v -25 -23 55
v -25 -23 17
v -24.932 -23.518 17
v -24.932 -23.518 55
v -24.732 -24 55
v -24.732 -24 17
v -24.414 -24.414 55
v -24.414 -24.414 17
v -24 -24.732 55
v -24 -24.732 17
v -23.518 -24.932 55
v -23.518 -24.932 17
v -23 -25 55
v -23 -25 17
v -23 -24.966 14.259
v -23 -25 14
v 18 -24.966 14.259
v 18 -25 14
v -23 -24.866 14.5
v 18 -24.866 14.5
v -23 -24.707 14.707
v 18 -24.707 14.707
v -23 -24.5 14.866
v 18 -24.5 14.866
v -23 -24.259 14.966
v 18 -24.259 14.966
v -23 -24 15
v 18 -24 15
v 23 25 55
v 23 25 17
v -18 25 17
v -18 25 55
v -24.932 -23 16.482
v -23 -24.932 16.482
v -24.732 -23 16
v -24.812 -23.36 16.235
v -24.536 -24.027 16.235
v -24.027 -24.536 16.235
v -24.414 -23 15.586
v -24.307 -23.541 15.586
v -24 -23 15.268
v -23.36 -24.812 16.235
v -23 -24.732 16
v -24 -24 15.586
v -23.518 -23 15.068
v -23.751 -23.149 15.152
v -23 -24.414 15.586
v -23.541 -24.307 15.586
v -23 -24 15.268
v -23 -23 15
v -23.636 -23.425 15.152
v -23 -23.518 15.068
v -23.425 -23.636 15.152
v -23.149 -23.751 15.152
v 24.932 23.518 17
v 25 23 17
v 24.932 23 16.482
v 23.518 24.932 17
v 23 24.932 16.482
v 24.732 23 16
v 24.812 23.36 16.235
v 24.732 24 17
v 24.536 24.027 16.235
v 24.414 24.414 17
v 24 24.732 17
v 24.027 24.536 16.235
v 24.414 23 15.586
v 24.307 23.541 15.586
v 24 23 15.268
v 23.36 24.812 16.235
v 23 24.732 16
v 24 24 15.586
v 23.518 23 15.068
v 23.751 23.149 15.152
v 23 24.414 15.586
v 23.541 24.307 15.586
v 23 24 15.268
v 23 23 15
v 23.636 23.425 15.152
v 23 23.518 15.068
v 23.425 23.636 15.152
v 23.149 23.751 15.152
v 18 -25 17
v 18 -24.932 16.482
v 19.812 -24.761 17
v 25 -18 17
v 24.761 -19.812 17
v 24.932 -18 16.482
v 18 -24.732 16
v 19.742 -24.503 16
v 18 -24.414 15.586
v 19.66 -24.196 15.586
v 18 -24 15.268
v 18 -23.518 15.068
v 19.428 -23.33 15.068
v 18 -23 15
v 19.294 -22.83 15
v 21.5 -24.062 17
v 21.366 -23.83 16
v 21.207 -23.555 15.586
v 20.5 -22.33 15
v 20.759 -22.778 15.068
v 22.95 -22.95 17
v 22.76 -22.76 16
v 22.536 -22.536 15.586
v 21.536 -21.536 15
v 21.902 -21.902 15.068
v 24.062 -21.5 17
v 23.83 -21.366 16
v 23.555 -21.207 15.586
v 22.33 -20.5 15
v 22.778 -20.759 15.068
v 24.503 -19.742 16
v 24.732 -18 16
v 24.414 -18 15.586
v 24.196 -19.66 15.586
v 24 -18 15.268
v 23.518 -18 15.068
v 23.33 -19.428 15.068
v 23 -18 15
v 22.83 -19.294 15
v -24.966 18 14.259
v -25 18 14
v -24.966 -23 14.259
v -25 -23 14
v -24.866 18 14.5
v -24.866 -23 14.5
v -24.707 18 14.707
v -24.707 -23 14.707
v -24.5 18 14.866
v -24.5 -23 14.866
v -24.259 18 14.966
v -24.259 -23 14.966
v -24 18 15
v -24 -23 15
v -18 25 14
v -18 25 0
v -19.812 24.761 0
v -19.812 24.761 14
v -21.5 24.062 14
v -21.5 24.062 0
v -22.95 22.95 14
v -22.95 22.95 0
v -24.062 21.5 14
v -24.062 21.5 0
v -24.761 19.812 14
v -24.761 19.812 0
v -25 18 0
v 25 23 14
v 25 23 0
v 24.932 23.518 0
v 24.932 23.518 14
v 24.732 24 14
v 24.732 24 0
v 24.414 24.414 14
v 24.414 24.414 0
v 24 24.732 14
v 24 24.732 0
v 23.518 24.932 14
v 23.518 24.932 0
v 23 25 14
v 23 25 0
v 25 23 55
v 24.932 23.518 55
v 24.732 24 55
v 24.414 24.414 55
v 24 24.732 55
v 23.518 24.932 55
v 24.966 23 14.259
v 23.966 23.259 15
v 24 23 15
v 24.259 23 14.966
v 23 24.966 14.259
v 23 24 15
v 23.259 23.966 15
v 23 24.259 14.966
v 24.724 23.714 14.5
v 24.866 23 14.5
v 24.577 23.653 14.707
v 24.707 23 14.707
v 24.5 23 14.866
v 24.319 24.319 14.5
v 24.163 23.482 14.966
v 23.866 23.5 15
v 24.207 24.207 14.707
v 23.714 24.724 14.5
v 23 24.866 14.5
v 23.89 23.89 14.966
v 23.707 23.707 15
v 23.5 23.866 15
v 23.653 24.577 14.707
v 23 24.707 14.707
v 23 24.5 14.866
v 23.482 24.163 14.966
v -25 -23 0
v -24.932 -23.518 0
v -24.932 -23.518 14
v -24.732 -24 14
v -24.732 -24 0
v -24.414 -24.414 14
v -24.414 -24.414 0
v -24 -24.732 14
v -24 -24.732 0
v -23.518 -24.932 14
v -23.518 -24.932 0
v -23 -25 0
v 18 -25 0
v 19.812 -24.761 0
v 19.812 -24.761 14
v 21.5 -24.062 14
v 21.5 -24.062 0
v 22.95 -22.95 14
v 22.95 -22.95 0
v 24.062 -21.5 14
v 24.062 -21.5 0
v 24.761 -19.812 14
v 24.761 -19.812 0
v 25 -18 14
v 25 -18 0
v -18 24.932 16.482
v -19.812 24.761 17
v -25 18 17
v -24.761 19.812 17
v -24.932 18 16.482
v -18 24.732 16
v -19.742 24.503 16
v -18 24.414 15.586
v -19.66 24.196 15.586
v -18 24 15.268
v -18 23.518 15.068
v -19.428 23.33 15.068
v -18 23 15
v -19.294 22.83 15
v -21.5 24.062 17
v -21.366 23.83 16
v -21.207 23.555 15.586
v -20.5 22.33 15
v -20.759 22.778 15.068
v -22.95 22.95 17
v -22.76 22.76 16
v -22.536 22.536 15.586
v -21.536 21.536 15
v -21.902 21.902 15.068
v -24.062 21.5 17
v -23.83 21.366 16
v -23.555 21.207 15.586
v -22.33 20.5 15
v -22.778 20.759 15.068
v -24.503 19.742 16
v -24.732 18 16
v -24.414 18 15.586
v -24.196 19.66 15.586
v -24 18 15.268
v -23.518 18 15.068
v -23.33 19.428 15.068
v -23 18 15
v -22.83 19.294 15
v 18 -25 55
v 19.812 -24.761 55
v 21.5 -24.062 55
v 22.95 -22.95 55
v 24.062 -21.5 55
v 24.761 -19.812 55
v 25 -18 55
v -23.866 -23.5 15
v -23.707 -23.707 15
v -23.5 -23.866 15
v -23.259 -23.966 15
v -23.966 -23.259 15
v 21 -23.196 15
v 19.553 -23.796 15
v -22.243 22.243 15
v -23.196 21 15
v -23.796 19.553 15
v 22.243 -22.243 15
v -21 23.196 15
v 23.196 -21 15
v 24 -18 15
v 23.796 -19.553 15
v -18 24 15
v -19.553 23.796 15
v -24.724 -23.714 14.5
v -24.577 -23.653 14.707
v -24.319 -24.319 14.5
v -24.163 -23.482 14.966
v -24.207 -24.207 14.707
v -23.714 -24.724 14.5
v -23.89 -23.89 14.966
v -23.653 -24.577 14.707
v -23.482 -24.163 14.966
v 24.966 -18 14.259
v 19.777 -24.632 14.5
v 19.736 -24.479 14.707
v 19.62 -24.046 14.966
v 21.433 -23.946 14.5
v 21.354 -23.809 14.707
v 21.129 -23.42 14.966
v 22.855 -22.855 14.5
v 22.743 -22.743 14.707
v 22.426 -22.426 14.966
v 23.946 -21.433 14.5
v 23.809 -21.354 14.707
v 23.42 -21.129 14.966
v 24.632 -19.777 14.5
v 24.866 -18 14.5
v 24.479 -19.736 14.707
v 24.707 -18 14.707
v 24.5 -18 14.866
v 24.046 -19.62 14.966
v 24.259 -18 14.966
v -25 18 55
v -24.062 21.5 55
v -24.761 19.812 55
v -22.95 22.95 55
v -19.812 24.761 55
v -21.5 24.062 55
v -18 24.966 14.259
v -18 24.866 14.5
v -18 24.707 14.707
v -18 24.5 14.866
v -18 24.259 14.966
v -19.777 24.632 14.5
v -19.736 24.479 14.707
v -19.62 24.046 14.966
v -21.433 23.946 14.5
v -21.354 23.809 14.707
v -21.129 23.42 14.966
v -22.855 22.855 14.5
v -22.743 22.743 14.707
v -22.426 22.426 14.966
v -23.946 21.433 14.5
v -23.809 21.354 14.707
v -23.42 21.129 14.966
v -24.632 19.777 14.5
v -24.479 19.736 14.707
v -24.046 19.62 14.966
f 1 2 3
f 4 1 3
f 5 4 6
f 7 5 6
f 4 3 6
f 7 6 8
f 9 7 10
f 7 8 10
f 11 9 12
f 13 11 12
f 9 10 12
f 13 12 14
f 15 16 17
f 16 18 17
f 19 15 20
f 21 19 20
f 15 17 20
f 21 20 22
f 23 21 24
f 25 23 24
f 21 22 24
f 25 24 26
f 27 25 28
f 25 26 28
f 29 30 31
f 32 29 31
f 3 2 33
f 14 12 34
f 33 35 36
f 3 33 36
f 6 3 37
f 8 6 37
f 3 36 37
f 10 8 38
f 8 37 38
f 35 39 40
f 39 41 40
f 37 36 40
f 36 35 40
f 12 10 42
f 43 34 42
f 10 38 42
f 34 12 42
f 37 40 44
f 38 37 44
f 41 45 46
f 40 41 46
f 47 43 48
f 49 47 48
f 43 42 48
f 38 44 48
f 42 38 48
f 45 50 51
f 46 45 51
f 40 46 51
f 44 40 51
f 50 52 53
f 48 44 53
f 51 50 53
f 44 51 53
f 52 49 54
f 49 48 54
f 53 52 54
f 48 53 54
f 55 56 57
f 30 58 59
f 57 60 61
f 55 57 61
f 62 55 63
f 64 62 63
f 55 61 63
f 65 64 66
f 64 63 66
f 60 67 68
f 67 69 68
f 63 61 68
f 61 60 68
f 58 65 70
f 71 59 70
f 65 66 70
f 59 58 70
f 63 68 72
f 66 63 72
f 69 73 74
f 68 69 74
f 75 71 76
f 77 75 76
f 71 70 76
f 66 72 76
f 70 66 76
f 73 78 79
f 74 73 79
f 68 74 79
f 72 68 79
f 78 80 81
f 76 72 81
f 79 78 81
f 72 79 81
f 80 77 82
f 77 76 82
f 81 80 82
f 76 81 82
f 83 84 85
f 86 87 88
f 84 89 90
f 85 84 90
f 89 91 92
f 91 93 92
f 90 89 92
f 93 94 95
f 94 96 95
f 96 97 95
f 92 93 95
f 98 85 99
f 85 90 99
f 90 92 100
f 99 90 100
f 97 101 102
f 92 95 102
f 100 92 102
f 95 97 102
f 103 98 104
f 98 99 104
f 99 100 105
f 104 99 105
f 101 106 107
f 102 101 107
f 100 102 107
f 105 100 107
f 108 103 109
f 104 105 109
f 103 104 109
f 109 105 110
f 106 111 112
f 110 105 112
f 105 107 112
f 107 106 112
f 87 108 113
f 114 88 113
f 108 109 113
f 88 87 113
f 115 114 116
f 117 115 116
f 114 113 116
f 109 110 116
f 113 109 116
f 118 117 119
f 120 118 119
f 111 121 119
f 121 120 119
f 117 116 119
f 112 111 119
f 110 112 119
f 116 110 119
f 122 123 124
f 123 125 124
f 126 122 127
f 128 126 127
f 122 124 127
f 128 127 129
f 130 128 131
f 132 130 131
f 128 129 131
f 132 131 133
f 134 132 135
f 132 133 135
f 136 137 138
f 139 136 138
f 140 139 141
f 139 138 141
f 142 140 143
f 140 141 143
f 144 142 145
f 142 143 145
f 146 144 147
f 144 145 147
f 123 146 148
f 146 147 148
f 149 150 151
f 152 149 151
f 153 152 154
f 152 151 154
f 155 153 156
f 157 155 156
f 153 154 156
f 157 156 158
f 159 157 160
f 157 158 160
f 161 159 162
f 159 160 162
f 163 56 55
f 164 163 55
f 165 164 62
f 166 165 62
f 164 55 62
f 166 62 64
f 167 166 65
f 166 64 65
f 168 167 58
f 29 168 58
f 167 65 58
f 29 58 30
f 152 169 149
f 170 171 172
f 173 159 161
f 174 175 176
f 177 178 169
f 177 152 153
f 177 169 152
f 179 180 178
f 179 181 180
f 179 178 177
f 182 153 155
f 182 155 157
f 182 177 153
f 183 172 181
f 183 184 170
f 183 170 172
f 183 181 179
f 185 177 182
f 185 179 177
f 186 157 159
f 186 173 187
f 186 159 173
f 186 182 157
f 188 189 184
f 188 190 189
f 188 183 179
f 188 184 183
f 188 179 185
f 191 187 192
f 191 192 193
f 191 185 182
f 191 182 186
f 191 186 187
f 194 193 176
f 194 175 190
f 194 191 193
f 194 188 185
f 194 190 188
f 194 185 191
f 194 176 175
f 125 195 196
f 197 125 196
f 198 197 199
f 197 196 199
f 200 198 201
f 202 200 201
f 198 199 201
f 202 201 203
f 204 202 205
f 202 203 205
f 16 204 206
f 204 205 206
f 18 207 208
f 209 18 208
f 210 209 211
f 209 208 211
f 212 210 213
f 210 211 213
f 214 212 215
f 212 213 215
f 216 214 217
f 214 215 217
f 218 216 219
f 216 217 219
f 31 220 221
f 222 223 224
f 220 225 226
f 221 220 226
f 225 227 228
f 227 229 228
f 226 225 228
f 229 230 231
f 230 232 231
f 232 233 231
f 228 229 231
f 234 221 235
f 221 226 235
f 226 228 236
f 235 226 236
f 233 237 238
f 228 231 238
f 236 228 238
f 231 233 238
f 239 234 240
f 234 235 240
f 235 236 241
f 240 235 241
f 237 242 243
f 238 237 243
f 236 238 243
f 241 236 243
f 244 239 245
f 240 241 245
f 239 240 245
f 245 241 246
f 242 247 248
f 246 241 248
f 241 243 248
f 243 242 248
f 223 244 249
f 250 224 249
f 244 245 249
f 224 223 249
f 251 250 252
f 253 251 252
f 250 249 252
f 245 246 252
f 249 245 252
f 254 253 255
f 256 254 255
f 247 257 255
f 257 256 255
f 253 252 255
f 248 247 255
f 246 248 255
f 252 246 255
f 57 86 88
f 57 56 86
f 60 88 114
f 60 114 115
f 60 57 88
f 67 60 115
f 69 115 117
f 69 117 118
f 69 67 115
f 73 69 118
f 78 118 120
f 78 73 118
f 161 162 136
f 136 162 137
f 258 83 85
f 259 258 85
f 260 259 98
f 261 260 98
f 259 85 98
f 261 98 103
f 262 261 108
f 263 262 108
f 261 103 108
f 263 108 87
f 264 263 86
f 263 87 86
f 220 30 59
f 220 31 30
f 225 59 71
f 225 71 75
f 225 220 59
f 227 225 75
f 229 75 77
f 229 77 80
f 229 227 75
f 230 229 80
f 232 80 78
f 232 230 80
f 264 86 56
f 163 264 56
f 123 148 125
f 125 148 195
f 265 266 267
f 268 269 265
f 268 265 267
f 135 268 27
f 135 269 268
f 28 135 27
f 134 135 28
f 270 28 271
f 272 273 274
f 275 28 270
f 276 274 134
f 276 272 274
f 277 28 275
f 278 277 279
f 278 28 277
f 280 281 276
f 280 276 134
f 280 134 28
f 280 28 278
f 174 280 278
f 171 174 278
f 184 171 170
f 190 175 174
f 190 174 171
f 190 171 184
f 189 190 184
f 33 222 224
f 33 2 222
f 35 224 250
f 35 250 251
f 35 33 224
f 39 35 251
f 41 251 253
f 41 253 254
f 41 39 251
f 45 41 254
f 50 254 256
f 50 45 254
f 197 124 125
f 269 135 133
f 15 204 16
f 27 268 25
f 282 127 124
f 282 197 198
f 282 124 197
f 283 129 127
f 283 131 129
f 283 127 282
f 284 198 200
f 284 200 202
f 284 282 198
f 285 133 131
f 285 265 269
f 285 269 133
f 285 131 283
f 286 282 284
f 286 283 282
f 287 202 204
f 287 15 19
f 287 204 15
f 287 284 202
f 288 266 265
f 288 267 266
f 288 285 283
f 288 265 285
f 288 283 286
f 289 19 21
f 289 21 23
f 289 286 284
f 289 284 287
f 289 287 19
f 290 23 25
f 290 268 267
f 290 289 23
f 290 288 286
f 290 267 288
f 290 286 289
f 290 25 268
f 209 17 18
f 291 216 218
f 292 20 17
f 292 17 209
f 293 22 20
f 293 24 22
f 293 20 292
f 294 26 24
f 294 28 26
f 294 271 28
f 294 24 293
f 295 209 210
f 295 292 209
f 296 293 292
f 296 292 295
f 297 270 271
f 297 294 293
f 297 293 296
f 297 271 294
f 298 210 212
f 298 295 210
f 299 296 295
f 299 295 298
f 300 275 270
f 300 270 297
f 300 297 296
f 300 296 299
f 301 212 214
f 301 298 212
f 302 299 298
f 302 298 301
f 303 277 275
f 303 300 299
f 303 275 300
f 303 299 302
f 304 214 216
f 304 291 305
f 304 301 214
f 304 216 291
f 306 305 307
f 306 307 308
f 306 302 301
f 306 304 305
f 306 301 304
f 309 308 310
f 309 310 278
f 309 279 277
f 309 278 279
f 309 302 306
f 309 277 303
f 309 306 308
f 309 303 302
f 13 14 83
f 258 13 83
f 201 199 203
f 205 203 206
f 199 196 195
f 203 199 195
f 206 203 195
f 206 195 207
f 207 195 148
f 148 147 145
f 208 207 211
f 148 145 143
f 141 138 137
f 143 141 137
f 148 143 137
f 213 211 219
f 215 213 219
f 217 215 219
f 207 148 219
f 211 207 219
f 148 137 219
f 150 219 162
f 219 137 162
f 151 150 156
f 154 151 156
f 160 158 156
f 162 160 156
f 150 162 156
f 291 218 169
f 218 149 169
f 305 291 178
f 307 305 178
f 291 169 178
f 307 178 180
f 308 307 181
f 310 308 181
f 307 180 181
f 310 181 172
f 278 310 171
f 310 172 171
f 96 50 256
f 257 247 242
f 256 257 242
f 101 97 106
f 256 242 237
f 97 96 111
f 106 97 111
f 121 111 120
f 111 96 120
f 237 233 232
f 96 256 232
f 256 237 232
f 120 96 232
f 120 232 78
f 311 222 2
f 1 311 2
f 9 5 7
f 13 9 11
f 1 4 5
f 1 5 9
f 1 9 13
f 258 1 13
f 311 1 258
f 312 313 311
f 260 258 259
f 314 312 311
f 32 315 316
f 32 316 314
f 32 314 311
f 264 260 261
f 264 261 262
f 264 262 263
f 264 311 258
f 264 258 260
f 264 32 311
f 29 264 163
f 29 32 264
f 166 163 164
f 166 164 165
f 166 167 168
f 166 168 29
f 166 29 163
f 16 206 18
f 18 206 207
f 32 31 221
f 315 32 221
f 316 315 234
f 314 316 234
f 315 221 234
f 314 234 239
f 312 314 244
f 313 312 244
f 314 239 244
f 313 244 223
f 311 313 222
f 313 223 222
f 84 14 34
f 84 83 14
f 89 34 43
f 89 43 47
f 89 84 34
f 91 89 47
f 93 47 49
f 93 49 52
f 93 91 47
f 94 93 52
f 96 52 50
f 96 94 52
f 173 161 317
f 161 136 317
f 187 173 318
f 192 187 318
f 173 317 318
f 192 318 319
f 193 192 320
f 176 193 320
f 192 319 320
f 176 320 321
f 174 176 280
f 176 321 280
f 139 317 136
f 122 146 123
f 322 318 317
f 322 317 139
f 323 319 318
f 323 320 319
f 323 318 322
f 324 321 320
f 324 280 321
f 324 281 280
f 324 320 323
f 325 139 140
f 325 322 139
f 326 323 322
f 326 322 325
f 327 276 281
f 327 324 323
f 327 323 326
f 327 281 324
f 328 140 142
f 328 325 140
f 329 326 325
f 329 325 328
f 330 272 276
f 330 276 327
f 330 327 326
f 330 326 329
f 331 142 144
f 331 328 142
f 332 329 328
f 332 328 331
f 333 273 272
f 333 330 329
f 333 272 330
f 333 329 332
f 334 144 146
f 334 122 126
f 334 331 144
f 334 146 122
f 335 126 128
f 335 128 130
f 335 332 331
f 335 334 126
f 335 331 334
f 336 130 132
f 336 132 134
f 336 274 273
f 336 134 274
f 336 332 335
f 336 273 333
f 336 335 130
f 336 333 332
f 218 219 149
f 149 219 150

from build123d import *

# Parameters (mm, degrees)
F1_DEPTH = 15
F2_DEPTH = 40
F3_R     = 1
F4_R     = 2


with BuildPart() as f1:
    # F0 (on Top) → F1 (new body)
    with BuildSketch(Plane.XY):
        with BuildLine():
            ThreePointArc((25, 23), (24.4142135624, 24.4142135624), (23, 25))
            Line((23, 25), (-18, 25))
            ThreePointArc((-18, 25), (-22.9497474683, 22.9497474683), (-25, 18))
            Line((-25, 18), (-25, -23))
            ThreePointArc((-25, -23), (-24.4142135624, -24.4142135624), (-23, -25))
            Line((-23, -25), (18, -25))
            ThreePointArc((18, -25), (22.9497474683, -22.9497474683), (25, -18))
            Line((25, -18), (25, 23))
        make_face()
    extrude(amount=F1_DEPTH)


with BuildPart() as f2:
    # F2 (new): a face of the model
    f2_faces = [f1.part.faces().sort_by_distance(p)[0] for p in [
        (0, 0, 15),
    ]]
    extrude(f2_faces, amount=F2_DEPTH)

    # F4
    f4_edges = [f2.edges().sort_by_distance(p)[0] for p in [
        (-2.5, -25, 15),
        (22.949747, -22.949747, 15),
        (25, 2.5, 15),
    ]]
    fillet(f4_edges, radius=F4_R)


with BuildPart() as f1_1:
    add(f1.part)

    # F3
    f3_edges = [f1_1.edges().sort_by_distance(p)[0] for p in [
        (-2.5, -25, 15),
        (22.949747, -22.949747, 15),
    ]]
    fillet(f3_edges, radius=F3_R)


solid = Compound([f2.part, f1_1.part])
